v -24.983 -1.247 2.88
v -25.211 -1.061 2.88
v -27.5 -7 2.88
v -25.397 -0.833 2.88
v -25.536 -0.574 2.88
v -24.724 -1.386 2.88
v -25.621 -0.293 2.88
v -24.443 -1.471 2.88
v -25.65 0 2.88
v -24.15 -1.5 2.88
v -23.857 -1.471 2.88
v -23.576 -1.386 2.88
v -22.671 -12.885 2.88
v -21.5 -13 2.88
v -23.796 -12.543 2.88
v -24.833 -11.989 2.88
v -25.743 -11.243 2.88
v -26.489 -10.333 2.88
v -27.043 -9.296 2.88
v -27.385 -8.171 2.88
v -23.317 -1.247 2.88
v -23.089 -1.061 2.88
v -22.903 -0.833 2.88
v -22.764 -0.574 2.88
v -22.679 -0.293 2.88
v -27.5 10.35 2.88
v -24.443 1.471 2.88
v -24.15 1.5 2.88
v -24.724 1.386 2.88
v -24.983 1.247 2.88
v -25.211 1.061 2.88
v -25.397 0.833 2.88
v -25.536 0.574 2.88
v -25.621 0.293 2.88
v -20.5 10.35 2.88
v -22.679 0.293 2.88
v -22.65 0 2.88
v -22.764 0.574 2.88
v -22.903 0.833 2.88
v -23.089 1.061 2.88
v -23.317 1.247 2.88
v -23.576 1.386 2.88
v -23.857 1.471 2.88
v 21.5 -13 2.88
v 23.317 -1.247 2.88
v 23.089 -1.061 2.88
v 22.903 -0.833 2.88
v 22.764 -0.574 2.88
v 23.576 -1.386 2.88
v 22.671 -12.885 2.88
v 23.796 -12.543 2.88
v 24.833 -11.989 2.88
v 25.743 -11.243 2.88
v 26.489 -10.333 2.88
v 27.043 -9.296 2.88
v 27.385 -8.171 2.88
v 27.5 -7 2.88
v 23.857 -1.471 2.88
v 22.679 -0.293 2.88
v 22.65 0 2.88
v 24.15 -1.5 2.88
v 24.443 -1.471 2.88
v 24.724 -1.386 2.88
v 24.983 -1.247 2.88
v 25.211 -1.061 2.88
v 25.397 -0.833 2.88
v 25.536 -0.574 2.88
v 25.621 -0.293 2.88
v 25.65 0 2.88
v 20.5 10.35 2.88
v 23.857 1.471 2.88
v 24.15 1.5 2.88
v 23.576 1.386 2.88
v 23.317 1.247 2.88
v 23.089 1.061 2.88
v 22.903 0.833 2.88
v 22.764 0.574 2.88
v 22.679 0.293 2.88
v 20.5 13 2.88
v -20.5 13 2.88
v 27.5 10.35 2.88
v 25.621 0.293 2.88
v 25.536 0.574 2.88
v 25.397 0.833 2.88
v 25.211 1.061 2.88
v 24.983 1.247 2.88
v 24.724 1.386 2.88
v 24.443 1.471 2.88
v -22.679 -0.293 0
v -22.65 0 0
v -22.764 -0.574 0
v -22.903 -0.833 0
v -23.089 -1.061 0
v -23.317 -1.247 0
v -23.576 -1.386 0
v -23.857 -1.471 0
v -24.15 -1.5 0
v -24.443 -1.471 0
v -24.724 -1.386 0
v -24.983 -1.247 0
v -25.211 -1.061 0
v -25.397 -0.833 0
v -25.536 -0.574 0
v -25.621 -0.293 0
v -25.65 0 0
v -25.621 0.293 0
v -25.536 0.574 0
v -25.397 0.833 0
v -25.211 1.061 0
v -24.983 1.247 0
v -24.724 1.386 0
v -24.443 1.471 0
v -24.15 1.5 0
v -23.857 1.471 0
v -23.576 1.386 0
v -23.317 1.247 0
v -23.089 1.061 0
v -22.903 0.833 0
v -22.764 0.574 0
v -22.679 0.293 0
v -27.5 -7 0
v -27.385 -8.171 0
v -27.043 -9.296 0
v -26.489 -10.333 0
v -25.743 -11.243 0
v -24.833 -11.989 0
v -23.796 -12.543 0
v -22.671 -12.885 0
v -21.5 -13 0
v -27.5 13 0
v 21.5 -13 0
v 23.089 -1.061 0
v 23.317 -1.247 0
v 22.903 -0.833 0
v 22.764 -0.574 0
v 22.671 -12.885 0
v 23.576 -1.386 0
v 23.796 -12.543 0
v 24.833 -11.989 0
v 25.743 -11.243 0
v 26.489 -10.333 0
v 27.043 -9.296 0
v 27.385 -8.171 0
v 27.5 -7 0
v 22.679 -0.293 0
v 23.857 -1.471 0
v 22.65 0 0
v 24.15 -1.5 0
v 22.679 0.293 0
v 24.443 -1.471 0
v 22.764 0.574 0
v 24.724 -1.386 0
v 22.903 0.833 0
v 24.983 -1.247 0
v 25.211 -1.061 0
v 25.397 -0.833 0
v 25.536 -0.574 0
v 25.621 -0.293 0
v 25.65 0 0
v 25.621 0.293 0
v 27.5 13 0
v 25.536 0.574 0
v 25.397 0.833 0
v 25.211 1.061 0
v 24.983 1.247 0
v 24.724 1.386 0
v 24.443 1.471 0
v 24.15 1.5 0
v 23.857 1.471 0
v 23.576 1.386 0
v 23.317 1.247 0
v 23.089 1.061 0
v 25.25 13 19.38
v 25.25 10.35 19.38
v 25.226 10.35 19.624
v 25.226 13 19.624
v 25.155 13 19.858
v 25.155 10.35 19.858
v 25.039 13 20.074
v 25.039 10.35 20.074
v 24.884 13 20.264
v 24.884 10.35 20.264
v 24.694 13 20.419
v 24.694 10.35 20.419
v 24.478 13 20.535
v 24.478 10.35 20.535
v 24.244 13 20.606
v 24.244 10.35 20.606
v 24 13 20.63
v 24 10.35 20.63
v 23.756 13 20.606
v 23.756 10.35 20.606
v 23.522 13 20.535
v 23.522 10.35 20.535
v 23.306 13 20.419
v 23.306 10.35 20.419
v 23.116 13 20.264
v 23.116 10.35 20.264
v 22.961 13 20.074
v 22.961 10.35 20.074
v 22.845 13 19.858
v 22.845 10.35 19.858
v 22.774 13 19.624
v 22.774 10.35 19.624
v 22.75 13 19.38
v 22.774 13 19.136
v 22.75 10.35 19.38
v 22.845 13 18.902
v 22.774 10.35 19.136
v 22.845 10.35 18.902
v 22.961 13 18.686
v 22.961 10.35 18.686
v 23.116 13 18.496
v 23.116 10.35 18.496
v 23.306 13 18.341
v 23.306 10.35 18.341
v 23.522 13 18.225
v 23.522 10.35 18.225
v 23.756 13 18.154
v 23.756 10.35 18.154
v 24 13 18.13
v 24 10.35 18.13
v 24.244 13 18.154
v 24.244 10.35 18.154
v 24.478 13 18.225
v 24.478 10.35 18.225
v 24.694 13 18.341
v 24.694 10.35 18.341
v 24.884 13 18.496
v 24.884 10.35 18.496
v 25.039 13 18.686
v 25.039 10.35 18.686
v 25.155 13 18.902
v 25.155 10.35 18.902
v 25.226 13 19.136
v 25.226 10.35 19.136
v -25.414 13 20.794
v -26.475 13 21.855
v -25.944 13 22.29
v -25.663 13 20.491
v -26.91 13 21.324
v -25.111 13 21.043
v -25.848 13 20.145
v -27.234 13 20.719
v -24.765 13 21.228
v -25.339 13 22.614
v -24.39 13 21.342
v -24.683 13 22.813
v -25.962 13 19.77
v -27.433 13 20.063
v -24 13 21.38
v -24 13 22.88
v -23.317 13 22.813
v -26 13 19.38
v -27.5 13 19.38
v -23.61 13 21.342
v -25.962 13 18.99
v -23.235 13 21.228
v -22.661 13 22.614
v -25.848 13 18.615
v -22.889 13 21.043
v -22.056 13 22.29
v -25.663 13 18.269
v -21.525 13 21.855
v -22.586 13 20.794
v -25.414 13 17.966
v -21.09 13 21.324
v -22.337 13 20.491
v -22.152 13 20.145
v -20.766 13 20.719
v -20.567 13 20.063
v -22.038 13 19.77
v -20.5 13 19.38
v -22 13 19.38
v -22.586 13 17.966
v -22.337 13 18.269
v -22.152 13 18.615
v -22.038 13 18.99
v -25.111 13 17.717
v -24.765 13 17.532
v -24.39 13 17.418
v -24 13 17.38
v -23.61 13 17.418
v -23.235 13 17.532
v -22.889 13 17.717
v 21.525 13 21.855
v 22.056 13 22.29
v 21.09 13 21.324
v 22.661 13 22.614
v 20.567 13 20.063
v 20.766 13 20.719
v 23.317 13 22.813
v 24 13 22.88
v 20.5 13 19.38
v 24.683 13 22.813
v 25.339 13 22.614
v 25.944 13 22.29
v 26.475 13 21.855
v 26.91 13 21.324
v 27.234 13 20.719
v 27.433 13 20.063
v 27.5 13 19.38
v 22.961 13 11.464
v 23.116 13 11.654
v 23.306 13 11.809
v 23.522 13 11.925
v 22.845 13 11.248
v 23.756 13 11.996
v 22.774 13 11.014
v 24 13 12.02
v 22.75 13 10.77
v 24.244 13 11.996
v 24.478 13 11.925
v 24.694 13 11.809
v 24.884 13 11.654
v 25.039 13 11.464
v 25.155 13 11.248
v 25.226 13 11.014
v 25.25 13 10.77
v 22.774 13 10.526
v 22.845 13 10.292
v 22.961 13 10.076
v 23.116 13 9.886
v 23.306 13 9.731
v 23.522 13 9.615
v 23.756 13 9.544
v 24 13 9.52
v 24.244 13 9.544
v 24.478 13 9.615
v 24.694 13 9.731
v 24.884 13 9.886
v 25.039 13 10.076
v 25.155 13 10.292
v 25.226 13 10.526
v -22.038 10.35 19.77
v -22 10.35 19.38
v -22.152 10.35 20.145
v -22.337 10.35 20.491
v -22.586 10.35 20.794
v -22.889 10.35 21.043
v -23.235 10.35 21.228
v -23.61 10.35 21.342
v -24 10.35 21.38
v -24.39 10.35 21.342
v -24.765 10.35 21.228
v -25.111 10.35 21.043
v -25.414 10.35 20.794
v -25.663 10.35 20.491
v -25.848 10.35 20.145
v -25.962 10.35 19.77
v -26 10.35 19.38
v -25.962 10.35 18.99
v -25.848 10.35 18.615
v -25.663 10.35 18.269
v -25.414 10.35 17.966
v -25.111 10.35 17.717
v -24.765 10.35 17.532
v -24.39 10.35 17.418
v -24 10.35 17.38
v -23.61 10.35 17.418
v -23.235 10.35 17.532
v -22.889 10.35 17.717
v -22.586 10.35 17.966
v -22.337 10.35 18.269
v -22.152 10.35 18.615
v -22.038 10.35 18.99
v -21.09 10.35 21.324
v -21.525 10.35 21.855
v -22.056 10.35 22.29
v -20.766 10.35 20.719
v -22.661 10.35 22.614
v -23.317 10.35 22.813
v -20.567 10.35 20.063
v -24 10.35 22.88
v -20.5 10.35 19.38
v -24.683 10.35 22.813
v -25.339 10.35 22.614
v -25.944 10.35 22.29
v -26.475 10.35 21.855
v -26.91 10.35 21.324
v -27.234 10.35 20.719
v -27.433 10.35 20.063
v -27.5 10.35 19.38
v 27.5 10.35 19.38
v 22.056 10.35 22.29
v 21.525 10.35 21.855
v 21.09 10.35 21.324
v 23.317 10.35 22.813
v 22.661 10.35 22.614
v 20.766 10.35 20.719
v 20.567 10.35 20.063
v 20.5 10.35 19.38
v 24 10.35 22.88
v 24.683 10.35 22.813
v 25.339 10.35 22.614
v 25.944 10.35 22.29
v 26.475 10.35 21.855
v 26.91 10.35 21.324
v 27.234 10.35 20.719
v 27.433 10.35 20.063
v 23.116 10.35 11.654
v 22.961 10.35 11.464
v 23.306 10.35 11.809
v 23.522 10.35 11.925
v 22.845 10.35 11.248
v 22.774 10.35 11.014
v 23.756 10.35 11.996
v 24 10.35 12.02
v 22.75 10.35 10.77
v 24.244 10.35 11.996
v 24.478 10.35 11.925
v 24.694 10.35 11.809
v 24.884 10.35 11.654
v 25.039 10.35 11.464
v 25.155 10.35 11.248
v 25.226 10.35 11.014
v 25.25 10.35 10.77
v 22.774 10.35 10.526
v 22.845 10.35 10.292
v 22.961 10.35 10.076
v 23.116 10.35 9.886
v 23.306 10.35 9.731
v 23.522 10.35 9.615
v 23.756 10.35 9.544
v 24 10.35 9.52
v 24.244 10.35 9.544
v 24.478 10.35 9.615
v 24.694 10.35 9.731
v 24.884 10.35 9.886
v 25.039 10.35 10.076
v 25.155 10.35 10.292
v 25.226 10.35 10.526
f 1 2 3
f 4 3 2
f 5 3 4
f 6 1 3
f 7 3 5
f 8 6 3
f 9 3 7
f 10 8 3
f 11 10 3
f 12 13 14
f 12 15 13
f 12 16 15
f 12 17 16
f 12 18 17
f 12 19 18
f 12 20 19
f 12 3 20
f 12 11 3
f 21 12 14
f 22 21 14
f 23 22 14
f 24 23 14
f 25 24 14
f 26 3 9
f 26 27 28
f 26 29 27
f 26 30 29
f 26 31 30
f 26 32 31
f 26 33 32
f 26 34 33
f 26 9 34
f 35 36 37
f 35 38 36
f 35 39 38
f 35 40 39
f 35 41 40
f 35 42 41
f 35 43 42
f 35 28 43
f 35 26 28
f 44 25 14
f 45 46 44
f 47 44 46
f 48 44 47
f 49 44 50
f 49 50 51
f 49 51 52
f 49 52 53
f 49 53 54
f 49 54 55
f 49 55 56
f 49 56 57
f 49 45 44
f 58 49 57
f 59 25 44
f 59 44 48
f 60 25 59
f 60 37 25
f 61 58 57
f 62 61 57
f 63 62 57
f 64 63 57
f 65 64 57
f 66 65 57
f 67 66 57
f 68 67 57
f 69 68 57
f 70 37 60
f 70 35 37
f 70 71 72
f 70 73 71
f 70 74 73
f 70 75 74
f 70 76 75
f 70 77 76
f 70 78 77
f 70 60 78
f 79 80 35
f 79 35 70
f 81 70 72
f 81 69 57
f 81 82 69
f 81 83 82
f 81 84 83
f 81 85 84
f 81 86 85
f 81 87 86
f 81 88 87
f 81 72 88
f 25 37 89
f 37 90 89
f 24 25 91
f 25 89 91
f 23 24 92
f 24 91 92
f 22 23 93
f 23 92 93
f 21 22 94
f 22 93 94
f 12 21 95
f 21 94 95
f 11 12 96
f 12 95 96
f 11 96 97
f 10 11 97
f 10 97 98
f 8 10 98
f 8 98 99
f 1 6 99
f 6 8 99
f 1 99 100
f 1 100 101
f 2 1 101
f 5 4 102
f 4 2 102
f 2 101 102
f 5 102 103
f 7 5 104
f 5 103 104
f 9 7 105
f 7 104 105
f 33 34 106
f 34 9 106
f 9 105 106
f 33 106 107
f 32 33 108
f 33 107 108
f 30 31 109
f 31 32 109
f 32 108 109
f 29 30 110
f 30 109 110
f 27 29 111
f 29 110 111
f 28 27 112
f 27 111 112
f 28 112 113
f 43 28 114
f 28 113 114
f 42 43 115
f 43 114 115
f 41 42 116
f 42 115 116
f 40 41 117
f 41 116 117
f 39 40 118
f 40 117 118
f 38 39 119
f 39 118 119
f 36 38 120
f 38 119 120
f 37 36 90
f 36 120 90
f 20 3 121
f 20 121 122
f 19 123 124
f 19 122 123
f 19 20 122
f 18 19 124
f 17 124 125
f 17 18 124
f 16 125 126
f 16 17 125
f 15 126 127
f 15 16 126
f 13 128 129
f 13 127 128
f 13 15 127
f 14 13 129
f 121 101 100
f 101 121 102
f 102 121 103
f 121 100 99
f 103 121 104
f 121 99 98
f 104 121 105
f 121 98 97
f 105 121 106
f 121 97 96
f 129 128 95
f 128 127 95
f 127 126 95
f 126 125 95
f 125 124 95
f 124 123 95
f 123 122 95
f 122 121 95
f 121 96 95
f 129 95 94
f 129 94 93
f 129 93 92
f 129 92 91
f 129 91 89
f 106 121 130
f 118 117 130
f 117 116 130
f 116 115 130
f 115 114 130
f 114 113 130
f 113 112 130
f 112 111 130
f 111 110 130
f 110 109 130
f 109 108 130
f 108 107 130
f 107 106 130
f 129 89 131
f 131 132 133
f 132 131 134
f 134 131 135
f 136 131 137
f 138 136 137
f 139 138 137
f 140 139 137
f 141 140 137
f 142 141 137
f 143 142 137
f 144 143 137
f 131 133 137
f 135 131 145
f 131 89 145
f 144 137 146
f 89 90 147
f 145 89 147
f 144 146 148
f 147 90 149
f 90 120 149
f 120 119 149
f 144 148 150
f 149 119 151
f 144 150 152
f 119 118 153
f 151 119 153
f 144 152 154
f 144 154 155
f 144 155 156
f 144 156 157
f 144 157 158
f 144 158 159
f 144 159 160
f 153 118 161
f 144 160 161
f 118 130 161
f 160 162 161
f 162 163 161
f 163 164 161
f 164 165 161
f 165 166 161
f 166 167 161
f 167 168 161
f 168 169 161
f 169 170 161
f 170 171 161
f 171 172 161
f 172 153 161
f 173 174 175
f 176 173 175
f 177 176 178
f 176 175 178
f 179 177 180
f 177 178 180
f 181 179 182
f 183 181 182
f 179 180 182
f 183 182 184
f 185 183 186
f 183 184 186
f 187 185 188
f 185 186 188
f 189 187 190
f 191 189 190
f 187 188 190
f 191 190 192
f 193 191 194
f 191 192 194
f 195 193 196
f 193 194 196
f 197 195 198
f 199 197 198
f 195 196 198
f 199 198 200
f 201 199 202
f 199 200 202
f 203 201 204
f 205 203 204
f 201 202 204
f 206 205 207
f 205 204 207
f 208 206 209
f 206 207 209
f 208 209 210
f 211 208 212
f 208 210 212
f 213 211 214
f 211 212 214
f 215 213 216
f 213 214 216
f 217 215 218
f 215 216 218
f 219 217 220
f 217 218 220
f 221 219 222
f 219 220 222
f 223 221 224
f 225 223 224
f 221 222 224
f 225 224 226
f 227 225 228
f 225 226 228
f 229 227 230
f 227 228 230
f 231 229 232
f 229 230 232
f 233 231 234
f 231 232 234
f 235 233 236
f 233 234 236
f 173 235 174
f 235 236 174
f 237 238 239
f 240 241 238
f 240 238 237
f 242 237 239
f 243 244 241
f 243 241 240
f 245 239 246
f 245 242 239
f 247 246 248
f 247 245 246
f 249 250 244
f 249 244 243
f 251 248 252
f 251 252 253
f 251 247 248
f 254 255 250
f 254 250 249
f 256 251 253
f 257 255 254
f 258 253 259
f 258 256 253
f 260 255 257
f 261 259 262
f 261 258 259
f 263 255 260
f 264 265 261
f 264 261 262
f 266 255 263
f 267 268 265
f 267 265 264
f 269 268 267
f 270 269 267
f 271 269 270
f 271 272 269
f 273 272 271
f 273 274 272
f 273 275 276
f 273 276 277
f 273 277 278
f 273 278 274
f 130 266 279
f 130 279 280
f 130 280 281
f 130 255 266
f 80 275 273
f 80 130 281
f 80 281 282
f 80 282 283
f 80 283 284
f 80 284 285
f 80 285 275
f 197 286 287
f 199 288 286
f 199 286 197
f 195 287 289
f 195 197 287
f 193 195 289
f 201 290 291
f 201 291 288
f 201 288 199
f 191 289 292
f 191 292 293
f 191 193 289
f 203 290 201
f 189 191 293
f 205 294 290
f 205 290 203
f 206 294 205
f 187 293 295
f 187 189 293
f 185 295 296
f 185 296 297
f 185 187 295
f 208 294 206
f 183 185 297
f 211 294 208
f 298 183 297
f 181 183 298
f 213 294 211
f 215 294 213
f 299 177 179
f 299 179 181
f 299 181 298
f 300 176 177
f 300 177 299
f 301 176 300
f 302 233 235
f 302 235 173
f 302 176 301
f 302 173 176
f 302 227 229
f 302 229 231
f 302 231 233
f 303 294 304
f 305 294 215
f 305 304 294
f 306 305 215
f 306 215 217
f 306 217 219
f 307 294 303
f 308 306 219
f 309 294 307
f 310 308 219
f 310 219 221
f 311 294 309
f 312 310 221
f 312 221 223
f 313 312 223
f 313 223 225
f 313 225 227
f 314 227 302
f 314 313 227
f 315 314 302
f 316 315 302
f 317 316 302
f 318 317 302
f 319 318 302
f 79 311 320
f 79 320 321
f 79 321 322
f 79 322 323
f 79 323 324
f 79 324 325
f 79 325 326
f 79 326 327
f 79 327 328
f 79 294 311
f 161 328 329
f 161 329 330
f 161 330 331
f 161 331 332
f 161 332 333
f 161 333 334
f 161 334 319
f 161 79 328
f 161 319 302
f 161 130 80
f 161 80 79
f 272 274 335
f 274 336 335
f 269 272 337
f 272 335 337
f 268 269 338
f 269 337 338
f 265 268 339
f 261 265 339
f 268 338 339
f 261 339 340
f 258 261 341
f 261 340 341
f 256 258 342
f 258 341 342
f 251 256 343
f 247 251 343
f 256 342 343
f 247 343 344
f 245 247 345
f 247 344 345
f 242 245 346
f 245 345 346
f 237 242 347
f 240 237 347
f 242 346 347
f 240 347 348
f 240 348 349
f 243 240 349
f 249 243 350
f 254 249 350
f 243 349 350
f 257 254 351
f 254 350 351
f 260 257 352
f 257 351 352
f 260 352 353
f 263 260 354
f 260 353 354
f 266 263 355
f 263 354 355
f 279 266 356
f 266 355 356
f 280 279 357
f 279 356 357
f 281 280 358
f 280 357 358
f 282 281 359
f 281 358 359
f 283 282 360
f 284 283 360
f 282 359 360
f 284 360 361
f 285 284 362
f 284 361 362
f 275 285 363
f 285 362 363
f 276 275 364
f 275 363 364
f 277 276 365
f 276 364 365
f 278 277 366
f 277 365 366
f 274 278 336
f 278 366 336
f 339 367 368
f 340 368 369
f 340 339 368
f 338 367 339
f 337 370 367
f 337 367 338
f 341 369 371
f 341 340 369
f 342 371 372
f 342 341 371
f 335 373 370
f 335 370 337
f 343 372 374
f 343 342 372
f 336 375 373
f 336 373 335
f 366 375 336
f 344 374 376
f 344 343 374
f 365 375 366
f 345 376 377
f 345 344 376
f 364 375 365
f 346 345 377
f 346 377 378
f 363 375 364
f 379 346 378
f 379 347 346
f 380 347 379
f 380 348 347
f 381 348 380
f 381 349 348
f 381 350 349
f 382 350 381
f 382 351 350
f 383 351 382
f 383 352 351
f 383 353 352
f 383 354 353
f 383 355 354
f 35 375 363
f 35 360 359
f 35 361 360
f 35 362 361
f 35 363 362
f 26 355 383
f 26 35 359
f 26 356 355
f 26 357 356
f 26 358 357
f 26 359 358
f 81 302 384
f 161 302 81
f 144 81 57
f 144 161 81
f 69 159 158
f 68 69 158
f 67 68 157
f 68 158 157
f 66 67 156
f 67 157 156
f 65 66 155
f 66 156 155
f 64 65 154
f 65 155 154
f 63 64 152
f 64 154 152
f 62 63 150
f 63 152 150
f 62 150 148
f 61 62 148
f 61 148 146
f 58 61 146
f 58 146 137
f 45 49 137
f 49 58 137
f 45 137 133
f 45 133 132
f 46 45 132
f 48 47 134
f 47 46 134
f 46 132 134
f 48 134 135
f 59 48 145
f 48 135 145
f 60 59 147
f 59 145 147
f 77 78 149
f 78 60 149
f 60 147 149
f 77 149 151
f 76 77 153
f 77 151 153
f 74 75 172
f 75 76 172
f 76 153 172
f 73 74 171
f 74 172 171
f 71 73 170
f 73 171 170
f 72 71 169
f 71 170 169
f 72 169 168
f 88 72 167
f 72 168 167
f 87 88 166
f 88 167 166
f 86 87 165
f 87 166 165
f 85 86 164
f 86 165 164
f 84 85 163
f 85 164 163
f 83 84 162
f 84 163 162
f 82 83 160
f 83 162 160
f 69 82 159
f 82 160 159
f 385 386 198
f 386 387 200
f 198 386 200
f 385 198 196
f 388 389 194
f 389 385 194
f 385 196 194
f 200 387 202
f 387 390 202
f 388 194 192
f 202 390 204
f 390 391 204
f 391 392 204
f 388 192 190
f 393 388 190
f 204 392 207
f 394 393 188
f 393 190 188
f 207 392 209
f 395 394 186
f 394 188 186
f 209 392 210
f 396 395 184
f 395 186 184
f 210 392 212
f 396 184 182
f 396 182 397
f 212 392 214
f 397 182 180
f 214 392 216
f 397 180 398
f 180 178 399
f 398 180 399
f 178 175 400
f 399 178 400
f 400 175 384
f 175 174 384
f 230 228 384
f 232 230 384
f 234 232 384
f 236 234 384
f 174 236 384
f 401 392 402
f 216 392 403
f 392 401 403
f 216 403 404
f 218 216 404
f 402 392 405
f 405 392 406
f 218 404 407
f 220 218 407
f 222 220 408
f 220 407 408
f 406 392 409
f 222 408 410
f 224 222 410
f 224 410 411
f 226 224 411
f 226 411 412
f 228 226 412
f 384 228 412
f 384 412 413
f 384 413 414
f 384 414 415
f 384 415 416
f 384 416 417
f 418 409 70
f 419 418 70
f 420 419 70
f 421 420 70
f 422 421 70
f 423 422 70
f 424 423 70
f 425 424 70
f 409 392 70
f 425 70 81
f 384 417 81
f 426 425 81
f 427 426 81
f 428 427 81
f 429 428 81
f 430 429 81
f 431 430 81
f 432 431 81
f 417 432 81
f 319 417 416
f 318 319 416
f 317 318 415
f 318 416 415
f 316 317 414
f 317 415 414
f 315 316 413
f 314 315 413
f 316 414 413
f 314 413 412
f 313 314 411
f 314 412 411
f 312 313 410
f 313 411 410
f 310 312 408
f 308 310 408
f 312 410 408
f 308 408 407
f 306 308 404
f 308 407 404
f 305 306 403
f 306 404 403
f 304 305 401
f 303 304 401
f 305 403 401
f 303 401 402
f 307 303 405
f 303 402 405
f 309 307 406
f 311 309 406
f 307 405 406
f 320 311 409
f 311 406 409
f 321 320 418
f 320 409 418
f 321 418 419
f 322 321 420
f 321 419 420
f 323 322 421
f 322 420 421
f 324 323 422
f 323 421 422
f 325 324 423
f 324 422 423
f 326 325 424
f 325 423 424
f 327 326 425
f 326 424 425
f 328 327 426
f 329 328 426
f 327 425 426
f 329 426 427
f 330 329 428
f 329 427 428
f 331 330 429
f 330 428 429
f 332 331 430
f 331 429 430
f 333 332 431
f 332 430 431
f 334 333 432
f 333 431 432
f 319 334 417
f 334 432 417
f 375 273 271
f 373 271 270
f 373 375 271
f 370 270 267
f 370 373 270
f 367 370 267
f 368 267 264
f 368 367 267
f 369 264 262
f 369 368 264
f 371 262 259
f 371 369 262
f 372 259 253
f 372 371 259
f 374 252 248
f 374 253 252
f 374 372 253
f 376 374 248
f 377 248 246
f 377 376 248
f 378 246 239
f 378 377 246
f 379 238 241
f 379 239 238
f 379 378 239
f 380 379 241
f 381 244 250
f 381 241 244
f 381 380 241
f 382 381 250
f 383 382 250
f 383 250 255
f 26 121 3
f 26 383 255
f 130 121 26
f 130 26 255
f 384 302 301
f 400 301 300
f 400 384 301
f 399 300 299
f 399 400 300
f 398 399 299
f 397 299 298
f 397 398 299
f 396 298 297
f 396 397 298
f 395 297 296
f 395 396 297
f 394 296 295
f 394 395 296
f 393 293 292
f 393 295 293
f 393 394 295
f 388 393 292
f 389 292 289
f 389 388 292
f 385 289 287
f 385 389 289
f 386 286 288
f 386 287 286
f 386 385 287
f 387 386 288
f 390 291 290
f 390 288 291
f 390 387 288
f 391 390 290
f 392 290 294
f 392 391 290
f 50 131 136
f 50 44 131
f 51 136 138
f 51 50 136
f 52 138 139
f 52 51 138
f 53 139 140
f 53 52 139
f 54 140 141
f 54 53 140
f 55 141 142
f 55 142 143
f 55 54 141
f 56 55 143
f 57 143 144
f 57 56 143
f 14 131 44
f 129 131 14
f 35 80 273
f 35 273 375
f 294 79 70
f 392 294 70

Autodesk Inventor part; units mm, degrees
ref_plane "YZ Plane" through (0, 0, 0) normal (1, 0, 0) x (0, 1, 0)
ref_plane "XZ Plane" through (0, 0, 0) normal (0, 1, 0) x (-1, 0, 0)
ref_plane "XY Plane" through (0, 0, 0) normal (0, 0, 1) x (1, 0, 0)
sketch "Base" plane through (0, 0, 0) normal (0, 0, 1) x (1, 0, 0)
  line L0 (27.5, -13) -> (-27.5, -13)
  line L1 (-27.5, -13) -> (-27.5, 13)
  line L2 (-27.5, 13) -> (27.5, 13)
  line L3 (27.5, 13) -> (27.5, -13)
  line L4 (27.5, -13) -> (-27.5, 13) construction
  line L5 (-27.5, -13) -> (27.5, 13) construction
  line L6 (-27.5, 0) -> (27.5, 0) construction
  circle A0 centre (-24.15, 0) radius 1.5
  line L7 (0, -18.2) -> (0, 18.2) construction
  line L8 (-25.65, -1.5) -> (-22.65, -1.5) construction
  line L9 (-22.65, -1.5) -> (-22.65, 1.5)
  line L10 (-22.65, 1.5) -> (-25.65, 1.5) construction
  line L11 (-25.65, 1.5) -> (-25.65, -1.5) construction
  line L12 (-25.65, -1.5) -> (-22.65, 1.5) construction
  line L13 (-22.65, -1.5) -> (-25.65, 1.5) construction
  circle A1 centre (24.15, 0) radius 1.5
  point P0 (0, 0)
  dimension "d0" = 55
  dimension "d1" = 26
  dimension "d4" = 3
  dimension "d5" = 1.85
extrude "BaseFeature" add sketch "Base" along normal blind 2.88
fillet "BaseFilletsFeature" radius 6 2 edges at (-27.5, -13, 1.44) (27.5, -13, 1.44)
sketch "ServoMount" plane through (0, 0, 2.88) normal (0, 0, 1) x (1, 0, 0)
  line L0 (27.5, 13) -> (-27.5, 13) projected
  line L1 (-27.5, 13) -> (-27.5, -7) projected
  line L2 (27.5, -7) -> (27.5, 13) projected
  line L3 (-27.5, 13) -> (-20.5, 13)
  line L4 (-20.5, 13) -> (-20.5, 10.35)
  line L5 (-20.5, 10.35) -> (-27.5, 10.35)
  line L6 (-27.5, 10.35) -> (-27.5, 13)
  line L7 (0, -18.2) -> (0, 18.2) construction
  line L8 (20.5, 13) -> (20.5, 10.35)
  line L9 (20.5, 10.35) -> (27.5, 10.35)
  point P0 (0, 0)
  point P1 (-24, 13)
  dimension "d7" = 2.65
  dimension "d8" = 7
extrude "ServoMountFEature" add sketch "ServoMount" along normal blind 20
sketch "ServoMountProfile" plane through (-27.5, 10.35, 2.88) normal (0, -1, 0) x (1, 0, 0)
  line L0 (7, 0) -> (0, 0) projected
  line L1 (7, 0) -> (7, 20) projected
  line L2 (0, 20) -> (7, 20) projected
  line L3 (0, 0) -> (0, 20) projected
  line L4 (27.5, -7.456) -> (27.5, 24.576) construction
  circle A0 centre (3.5, 16.5) radius 3.5
  line L5 (3.5, 20) -> (3.5, 0) construction
  line L6 (0, 20) -> (7, 20) projected
  line L7 (0, 0) -> (0, 20) projected
  circle A1 centre (51.5, 16.5) radius 3.5
  line L8 (48, 0) -> (48, 20) projected
  line L9 (48, 20) -> (55, 20) projected
  line L10 (55, 0) -> (55, 20) projected
  point P0 (27.5, -2.88)
  point P1 (55, 16.5)
  point P2 (51.5, 20)
  point P3 (48, 16.5)
  point P4 (0, 16.5)
  point P5 (3.5, 20)
  point P6 (7, 16.5)
extrude "ServoMountProfileFeature" cut sketch "ServoMountProfile" against normal blind 20 contours A0 L2 L1 | L3 L2 A0 | A1 L9 L10 | A1 L8 L9
sketch "ServoMountHoles" plane through (-27.5, 10.35, 2.88) normal (0, -1, 0) x (1, 0, 0)
  arc A0 (7, 16.5) -> (0, 16.5) centre (3.5, 16.5) ccw construction
  line L0 (0, 0) -> (0, 16.5) construction
  line L1 (7, 0) -> (0, 0) construction
  line L2 (7, 0) -> (7, 16.5) construction
  line L3 (27.5, 24.576) -> (27.5, -7.456) construction
  circle A1 centre (51.5, 16.5) radius 1.25
  circle A2 centre (51.5, 7.89) radius 1.25
  arc A3 (-3.5754, 4) -> (-3.5754, 7) centre (-2.2525, 5.5) ccw construction
  arc A4 (-3.5754, 15) -> (-3.5754, 18) centre (-2.2525, 16.5) ccw construction
  circle A5 centre (-2.2525, 5.5) radius 2
  arc A6 (7, 16.5) -> (0, 16.5) centre (3.5, 16.5) ccw projected
  circle A7 centre (3.5, 16.5) radius 2
  point P0 (27.5, -2.88)
  dimension "d17" = 4
  dimension "d18" = 4
extrude "ServoMountHolesFeature" cut sketch "ServoMountHoles" against normal through all
properties part number "M3RCServoMountBracket"
